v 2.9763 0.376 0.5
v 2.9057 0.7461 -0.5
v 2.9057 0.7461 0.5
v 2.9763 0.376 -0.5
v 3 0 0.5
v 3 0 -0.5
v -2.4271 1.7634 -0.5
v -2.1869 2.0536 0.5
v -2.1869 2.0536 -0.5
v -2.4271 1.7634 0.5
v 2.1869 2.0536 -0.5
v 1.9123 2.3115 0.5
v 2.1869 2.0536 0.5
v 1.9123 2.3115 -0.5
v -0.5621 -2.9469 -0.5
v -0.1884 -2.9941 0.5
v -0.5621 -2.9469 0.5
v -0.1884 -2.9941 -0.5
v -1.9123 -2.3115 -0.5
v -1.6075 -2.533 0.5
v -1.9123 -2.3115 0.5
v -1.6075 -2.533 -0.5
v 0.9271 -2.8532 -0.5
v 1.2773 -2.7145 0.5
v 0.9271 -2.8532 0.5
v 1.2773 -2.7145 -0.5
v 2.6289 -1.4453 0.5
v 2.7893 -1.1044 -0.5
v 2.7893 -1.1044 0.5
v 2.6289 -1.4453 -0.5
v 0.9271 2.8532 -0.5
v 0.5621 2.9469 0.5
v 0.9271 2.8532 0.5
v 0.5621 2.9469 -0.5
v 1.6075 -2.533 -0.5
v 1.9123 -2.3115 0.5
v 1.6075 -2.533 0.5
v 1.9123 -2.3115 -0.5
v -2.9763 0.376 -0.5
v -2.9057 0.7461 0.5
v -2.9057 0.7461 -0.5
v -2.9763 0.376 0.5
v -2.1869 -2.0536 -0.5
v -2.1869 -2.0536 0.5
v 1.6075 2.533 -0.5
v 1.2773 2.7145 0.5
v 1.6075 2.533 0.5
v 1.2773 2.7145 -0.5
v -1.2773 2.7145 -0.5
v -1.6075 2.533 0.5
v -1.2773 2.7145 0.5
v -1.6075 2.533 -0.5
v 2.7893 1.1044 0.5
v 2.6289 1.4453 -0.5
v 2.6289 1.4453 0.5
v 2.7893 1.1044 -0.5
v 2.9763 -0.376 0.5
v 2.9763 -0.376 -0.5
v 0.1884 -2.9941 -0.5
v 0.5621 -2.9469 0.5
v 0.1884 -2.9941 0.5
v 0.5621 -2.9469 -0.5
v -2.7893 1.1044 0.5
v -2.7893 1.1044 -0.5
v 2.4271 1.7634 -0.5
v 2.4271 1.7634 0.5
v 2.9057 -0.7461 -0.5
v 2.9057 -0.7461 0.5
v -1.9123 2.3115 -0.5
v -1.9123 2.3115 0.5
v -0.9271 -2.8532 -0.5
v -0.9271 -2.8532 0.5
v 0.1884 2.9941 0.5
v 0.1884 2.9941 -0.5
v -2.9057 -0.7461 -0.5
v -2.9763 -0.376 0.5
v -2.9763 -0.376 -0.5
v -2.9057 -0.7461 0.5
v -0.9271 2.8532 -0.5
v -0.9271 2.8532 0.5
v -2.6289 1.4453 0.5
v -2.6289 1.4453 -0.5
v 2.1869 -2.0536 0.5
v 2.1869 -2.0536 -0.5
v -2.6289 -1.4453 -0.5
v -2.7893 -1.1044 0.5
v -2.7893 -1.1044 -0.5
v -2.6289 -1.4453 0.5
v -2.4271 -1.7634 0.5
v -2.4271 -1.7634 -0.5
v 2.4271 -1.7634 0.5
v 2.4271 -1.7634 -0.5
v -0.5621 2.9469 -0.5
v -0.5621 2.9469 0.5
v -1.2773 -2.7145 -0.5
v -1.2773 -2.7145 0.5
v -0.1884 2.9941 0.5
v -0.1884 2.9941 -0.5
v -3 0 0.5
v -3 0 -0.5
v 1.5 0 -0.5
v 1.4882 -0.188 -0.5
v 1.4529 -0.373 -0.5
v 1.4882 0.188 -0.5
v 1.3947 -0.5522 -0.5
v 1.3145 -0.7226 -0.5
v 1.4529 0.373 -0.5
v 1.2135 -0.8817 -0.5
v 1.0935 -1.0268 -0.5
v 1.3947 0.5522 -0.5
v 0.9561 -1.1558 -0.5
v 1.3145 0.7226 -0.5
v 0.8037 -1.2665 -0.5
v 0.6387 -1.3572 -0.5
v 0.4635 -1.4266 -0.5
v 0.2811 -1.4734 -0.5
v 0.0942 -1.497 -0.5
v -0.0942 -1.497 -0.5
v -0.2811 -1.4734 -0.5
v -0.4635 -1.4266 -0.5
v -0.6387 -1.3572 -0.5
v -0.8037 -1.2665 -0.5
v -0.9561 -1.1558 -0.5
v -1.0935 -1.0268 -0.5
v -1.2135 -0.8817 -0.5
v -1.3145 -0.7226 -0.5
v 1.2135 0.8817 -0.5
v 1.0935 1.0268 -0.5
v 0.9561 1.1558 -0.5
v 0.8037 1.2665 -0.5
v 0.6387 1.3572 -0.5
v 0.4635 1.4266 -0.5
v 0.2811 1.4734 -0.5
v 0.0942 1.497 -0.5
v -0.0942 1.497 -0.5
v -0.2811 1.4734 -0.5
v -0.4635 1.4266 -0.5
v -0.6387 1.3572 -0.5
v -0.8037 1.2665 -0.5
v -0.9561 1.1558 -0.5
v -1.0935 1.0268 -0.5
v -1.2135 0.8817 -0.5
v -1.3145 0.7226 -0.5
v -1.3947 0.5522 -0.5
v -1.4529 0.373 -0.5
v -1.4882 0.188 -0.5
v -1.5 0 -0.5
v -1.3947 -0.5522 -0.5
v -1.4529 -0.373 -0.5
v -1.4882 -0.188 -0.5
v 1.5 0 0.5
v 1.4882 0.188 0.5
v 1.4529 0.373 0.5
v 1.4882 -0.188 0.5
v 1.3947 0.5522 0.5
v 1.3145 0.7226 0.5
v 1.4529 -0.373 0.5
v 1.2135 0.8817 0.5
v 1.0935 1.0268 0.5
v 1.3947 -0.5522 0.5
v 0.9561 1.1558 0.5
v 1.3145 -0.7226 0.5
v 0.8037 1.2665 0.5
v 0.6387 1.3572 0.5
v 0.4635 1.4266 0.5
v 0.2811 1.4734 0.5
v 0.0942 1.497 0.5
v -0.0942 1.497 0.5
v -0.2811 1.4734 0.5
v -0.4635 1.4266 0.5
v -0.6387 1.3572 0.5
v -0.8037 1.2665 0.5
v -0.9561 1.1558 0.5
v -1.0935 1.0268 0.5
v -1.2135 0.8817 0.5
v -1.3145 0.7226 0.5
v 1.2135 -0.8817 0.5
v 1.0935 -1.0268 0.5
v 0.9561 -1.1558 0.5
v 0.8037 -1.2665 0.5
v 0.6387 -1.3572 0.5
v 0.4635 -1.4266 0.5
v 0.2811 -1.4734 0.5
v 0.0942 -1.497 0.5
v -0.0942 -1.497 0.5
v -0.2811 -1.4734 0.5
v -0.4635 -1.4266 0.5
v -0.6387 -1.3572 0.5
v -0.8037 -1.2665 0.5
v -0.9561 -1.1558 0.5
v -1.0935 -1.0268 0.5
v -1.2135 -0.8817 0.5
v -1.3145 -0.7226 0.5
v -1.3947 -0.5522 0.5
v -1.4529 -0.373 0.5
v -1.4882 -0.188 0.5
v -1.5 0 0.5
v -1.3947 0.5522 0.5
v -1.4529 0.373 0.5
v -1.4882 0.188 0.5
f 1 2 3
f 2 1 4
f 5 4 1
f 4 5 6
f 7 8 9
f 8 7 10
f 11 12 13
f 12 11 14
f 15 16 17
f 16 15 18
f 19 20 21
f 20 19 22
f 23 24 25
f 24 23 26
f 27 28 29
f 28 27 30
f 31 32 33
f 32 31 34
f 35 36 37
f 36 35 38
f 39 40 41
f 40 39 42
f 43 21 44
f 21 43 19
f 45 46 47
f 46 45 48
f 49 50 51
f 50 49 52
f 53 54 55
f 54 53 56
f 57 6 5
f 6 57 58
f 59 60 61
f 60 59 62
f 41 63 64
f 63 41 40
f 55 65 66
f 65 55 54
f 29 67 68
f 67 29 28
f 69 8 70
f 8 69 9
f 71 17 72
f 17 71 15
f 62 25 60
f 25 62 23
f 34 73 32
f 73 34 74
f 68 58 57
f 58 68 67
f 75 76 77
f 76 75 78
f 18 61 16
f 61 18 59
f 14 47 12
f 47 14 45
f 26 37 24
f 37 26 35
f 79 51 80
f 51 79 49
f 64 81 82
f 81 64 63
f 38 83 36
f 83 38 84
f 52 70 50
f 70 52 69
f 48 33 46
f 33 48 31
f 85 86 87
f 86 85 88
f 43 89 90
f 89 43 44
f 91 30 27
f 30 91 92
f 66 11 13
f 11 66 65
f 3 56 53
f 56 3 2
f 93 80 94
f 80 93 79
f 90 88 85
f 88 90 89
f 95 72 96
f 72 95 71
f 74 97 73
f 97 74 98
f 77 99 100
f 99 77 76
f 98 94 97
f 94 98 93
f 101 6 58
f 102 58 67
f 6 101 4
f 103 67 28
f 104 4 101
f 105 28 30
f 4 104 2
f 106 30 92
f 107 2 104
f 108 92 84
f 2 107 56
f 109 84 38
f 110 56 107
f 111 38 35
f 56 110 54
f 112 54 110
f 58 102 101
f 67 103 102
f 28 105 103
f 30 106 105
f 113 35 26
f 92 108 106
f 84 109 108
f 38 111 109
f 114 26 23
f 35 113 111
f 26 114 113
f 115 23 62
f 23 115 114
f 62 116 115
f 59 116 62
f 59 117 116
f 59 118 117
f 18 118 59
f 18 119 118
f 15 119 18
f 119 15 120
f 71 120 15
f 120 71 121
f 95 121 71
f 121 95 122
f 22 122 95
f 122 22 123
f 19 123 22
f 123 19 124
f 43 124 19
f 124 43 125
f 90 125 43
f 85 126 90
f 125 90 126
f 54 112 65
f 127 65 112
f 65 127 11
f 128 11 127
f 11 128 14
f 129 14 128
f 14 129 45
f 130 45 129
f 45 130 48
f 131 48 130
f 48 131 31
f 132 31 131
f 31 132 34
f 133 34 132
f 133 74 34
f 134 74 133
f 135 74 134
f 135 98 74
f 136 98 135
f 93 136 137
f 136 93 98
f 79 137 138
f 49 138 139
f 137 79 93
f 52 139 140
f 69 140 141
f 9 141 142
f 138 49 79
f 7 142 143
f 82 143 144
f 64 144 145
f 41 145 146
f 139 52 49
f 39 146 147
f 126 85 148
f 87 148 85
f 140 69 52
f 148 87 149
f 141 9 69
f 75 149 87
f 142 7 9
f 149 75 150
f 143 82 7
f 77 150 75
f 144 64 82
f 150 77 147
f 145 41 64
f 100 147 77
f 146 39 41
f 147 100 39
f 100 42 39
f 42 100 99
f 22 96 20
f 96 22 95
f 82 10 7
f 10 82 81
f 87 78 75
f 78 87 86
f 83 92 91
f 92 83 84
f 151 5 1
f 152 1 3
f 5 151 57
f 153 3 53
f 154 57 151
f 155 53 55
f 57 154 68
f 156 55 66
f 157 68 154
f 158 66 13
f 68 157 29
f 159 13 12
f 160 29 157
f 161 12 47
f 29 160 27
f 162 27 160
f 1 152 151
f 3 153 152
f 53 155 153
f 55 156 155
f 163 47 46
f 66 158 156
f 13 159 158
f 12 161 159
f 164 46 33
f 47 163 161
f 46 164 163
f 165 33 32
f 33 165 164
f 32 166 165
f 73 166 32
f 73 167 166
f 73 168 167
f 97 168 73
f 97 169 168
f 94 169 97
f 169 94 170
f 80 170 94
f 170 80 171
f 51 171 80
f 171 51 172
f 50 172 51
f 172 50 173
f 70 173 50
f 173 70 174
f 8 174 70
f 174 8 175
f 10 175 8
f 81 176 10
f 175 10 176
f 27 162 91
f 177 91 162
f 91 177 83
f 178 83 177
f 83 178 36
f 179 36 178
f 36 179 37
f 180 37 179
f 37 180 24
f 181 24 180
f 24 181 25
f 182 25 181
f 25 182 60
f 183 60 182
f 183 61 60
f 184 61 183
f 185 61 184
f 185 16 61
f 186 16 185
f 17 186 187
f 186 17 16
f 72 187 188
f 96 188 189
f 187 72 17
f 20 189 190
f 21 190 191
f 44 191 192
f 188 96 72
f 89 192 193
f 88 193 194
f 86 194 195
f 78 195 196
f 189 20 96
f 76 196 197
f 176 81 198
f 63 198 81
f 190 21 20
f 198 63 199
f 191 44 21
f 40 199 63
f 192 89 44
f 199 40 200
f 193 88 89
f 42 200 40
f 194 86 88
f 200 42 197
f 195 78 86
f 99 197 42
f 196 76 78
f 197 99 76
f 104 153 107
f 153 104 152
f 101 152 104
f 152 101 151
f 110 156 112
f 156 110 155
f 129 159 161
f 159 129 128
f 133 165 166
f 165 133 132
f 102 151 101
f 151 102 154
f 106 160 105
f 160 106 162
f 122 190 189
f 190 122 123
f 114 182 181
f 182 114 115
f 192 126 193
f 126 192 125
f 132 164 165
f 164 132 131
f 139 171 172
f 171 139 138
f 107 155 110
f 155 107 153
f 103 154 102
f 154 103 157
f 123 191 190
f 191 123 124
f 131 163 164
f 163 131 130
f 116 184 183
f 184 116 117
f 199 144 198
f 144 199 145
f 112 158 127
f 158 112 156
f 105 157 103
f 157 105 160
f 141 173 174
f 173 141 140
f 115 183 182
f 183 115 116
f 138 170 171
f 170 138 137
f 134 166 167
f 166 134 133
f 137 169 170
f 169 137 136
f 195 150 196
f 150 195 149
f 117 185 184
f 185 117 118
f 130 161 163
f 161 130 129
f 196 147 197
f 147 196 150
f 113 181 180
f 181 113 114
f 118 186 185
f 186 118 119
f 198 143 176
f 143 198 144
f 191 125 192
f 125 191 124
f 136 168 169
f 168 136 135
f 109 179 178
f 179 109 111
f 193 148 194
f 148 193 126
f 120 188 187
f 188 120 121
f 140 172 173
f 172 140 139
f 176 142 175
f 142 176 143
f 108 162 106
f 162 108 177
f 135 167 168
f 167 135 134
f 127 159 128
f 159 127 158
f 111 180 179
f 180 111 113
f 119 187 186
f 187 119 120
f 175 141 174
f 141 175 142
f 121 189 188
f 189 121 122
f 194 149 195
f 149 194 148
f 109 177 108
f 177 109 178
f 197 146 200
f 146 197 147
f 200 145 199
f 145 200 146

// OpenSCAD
$fn = 50;


difference() {
	union() {
		translate(v = [0, 0, -0.5000000000]) {
			cylinder(h = 1, r = 3.0000000000);
		}
	}
	union() {
		translate(v = [0, 0, -100.0000000000]) {
			cylinder(h = 200, r = 1.5000000000);
		}
	}
}
